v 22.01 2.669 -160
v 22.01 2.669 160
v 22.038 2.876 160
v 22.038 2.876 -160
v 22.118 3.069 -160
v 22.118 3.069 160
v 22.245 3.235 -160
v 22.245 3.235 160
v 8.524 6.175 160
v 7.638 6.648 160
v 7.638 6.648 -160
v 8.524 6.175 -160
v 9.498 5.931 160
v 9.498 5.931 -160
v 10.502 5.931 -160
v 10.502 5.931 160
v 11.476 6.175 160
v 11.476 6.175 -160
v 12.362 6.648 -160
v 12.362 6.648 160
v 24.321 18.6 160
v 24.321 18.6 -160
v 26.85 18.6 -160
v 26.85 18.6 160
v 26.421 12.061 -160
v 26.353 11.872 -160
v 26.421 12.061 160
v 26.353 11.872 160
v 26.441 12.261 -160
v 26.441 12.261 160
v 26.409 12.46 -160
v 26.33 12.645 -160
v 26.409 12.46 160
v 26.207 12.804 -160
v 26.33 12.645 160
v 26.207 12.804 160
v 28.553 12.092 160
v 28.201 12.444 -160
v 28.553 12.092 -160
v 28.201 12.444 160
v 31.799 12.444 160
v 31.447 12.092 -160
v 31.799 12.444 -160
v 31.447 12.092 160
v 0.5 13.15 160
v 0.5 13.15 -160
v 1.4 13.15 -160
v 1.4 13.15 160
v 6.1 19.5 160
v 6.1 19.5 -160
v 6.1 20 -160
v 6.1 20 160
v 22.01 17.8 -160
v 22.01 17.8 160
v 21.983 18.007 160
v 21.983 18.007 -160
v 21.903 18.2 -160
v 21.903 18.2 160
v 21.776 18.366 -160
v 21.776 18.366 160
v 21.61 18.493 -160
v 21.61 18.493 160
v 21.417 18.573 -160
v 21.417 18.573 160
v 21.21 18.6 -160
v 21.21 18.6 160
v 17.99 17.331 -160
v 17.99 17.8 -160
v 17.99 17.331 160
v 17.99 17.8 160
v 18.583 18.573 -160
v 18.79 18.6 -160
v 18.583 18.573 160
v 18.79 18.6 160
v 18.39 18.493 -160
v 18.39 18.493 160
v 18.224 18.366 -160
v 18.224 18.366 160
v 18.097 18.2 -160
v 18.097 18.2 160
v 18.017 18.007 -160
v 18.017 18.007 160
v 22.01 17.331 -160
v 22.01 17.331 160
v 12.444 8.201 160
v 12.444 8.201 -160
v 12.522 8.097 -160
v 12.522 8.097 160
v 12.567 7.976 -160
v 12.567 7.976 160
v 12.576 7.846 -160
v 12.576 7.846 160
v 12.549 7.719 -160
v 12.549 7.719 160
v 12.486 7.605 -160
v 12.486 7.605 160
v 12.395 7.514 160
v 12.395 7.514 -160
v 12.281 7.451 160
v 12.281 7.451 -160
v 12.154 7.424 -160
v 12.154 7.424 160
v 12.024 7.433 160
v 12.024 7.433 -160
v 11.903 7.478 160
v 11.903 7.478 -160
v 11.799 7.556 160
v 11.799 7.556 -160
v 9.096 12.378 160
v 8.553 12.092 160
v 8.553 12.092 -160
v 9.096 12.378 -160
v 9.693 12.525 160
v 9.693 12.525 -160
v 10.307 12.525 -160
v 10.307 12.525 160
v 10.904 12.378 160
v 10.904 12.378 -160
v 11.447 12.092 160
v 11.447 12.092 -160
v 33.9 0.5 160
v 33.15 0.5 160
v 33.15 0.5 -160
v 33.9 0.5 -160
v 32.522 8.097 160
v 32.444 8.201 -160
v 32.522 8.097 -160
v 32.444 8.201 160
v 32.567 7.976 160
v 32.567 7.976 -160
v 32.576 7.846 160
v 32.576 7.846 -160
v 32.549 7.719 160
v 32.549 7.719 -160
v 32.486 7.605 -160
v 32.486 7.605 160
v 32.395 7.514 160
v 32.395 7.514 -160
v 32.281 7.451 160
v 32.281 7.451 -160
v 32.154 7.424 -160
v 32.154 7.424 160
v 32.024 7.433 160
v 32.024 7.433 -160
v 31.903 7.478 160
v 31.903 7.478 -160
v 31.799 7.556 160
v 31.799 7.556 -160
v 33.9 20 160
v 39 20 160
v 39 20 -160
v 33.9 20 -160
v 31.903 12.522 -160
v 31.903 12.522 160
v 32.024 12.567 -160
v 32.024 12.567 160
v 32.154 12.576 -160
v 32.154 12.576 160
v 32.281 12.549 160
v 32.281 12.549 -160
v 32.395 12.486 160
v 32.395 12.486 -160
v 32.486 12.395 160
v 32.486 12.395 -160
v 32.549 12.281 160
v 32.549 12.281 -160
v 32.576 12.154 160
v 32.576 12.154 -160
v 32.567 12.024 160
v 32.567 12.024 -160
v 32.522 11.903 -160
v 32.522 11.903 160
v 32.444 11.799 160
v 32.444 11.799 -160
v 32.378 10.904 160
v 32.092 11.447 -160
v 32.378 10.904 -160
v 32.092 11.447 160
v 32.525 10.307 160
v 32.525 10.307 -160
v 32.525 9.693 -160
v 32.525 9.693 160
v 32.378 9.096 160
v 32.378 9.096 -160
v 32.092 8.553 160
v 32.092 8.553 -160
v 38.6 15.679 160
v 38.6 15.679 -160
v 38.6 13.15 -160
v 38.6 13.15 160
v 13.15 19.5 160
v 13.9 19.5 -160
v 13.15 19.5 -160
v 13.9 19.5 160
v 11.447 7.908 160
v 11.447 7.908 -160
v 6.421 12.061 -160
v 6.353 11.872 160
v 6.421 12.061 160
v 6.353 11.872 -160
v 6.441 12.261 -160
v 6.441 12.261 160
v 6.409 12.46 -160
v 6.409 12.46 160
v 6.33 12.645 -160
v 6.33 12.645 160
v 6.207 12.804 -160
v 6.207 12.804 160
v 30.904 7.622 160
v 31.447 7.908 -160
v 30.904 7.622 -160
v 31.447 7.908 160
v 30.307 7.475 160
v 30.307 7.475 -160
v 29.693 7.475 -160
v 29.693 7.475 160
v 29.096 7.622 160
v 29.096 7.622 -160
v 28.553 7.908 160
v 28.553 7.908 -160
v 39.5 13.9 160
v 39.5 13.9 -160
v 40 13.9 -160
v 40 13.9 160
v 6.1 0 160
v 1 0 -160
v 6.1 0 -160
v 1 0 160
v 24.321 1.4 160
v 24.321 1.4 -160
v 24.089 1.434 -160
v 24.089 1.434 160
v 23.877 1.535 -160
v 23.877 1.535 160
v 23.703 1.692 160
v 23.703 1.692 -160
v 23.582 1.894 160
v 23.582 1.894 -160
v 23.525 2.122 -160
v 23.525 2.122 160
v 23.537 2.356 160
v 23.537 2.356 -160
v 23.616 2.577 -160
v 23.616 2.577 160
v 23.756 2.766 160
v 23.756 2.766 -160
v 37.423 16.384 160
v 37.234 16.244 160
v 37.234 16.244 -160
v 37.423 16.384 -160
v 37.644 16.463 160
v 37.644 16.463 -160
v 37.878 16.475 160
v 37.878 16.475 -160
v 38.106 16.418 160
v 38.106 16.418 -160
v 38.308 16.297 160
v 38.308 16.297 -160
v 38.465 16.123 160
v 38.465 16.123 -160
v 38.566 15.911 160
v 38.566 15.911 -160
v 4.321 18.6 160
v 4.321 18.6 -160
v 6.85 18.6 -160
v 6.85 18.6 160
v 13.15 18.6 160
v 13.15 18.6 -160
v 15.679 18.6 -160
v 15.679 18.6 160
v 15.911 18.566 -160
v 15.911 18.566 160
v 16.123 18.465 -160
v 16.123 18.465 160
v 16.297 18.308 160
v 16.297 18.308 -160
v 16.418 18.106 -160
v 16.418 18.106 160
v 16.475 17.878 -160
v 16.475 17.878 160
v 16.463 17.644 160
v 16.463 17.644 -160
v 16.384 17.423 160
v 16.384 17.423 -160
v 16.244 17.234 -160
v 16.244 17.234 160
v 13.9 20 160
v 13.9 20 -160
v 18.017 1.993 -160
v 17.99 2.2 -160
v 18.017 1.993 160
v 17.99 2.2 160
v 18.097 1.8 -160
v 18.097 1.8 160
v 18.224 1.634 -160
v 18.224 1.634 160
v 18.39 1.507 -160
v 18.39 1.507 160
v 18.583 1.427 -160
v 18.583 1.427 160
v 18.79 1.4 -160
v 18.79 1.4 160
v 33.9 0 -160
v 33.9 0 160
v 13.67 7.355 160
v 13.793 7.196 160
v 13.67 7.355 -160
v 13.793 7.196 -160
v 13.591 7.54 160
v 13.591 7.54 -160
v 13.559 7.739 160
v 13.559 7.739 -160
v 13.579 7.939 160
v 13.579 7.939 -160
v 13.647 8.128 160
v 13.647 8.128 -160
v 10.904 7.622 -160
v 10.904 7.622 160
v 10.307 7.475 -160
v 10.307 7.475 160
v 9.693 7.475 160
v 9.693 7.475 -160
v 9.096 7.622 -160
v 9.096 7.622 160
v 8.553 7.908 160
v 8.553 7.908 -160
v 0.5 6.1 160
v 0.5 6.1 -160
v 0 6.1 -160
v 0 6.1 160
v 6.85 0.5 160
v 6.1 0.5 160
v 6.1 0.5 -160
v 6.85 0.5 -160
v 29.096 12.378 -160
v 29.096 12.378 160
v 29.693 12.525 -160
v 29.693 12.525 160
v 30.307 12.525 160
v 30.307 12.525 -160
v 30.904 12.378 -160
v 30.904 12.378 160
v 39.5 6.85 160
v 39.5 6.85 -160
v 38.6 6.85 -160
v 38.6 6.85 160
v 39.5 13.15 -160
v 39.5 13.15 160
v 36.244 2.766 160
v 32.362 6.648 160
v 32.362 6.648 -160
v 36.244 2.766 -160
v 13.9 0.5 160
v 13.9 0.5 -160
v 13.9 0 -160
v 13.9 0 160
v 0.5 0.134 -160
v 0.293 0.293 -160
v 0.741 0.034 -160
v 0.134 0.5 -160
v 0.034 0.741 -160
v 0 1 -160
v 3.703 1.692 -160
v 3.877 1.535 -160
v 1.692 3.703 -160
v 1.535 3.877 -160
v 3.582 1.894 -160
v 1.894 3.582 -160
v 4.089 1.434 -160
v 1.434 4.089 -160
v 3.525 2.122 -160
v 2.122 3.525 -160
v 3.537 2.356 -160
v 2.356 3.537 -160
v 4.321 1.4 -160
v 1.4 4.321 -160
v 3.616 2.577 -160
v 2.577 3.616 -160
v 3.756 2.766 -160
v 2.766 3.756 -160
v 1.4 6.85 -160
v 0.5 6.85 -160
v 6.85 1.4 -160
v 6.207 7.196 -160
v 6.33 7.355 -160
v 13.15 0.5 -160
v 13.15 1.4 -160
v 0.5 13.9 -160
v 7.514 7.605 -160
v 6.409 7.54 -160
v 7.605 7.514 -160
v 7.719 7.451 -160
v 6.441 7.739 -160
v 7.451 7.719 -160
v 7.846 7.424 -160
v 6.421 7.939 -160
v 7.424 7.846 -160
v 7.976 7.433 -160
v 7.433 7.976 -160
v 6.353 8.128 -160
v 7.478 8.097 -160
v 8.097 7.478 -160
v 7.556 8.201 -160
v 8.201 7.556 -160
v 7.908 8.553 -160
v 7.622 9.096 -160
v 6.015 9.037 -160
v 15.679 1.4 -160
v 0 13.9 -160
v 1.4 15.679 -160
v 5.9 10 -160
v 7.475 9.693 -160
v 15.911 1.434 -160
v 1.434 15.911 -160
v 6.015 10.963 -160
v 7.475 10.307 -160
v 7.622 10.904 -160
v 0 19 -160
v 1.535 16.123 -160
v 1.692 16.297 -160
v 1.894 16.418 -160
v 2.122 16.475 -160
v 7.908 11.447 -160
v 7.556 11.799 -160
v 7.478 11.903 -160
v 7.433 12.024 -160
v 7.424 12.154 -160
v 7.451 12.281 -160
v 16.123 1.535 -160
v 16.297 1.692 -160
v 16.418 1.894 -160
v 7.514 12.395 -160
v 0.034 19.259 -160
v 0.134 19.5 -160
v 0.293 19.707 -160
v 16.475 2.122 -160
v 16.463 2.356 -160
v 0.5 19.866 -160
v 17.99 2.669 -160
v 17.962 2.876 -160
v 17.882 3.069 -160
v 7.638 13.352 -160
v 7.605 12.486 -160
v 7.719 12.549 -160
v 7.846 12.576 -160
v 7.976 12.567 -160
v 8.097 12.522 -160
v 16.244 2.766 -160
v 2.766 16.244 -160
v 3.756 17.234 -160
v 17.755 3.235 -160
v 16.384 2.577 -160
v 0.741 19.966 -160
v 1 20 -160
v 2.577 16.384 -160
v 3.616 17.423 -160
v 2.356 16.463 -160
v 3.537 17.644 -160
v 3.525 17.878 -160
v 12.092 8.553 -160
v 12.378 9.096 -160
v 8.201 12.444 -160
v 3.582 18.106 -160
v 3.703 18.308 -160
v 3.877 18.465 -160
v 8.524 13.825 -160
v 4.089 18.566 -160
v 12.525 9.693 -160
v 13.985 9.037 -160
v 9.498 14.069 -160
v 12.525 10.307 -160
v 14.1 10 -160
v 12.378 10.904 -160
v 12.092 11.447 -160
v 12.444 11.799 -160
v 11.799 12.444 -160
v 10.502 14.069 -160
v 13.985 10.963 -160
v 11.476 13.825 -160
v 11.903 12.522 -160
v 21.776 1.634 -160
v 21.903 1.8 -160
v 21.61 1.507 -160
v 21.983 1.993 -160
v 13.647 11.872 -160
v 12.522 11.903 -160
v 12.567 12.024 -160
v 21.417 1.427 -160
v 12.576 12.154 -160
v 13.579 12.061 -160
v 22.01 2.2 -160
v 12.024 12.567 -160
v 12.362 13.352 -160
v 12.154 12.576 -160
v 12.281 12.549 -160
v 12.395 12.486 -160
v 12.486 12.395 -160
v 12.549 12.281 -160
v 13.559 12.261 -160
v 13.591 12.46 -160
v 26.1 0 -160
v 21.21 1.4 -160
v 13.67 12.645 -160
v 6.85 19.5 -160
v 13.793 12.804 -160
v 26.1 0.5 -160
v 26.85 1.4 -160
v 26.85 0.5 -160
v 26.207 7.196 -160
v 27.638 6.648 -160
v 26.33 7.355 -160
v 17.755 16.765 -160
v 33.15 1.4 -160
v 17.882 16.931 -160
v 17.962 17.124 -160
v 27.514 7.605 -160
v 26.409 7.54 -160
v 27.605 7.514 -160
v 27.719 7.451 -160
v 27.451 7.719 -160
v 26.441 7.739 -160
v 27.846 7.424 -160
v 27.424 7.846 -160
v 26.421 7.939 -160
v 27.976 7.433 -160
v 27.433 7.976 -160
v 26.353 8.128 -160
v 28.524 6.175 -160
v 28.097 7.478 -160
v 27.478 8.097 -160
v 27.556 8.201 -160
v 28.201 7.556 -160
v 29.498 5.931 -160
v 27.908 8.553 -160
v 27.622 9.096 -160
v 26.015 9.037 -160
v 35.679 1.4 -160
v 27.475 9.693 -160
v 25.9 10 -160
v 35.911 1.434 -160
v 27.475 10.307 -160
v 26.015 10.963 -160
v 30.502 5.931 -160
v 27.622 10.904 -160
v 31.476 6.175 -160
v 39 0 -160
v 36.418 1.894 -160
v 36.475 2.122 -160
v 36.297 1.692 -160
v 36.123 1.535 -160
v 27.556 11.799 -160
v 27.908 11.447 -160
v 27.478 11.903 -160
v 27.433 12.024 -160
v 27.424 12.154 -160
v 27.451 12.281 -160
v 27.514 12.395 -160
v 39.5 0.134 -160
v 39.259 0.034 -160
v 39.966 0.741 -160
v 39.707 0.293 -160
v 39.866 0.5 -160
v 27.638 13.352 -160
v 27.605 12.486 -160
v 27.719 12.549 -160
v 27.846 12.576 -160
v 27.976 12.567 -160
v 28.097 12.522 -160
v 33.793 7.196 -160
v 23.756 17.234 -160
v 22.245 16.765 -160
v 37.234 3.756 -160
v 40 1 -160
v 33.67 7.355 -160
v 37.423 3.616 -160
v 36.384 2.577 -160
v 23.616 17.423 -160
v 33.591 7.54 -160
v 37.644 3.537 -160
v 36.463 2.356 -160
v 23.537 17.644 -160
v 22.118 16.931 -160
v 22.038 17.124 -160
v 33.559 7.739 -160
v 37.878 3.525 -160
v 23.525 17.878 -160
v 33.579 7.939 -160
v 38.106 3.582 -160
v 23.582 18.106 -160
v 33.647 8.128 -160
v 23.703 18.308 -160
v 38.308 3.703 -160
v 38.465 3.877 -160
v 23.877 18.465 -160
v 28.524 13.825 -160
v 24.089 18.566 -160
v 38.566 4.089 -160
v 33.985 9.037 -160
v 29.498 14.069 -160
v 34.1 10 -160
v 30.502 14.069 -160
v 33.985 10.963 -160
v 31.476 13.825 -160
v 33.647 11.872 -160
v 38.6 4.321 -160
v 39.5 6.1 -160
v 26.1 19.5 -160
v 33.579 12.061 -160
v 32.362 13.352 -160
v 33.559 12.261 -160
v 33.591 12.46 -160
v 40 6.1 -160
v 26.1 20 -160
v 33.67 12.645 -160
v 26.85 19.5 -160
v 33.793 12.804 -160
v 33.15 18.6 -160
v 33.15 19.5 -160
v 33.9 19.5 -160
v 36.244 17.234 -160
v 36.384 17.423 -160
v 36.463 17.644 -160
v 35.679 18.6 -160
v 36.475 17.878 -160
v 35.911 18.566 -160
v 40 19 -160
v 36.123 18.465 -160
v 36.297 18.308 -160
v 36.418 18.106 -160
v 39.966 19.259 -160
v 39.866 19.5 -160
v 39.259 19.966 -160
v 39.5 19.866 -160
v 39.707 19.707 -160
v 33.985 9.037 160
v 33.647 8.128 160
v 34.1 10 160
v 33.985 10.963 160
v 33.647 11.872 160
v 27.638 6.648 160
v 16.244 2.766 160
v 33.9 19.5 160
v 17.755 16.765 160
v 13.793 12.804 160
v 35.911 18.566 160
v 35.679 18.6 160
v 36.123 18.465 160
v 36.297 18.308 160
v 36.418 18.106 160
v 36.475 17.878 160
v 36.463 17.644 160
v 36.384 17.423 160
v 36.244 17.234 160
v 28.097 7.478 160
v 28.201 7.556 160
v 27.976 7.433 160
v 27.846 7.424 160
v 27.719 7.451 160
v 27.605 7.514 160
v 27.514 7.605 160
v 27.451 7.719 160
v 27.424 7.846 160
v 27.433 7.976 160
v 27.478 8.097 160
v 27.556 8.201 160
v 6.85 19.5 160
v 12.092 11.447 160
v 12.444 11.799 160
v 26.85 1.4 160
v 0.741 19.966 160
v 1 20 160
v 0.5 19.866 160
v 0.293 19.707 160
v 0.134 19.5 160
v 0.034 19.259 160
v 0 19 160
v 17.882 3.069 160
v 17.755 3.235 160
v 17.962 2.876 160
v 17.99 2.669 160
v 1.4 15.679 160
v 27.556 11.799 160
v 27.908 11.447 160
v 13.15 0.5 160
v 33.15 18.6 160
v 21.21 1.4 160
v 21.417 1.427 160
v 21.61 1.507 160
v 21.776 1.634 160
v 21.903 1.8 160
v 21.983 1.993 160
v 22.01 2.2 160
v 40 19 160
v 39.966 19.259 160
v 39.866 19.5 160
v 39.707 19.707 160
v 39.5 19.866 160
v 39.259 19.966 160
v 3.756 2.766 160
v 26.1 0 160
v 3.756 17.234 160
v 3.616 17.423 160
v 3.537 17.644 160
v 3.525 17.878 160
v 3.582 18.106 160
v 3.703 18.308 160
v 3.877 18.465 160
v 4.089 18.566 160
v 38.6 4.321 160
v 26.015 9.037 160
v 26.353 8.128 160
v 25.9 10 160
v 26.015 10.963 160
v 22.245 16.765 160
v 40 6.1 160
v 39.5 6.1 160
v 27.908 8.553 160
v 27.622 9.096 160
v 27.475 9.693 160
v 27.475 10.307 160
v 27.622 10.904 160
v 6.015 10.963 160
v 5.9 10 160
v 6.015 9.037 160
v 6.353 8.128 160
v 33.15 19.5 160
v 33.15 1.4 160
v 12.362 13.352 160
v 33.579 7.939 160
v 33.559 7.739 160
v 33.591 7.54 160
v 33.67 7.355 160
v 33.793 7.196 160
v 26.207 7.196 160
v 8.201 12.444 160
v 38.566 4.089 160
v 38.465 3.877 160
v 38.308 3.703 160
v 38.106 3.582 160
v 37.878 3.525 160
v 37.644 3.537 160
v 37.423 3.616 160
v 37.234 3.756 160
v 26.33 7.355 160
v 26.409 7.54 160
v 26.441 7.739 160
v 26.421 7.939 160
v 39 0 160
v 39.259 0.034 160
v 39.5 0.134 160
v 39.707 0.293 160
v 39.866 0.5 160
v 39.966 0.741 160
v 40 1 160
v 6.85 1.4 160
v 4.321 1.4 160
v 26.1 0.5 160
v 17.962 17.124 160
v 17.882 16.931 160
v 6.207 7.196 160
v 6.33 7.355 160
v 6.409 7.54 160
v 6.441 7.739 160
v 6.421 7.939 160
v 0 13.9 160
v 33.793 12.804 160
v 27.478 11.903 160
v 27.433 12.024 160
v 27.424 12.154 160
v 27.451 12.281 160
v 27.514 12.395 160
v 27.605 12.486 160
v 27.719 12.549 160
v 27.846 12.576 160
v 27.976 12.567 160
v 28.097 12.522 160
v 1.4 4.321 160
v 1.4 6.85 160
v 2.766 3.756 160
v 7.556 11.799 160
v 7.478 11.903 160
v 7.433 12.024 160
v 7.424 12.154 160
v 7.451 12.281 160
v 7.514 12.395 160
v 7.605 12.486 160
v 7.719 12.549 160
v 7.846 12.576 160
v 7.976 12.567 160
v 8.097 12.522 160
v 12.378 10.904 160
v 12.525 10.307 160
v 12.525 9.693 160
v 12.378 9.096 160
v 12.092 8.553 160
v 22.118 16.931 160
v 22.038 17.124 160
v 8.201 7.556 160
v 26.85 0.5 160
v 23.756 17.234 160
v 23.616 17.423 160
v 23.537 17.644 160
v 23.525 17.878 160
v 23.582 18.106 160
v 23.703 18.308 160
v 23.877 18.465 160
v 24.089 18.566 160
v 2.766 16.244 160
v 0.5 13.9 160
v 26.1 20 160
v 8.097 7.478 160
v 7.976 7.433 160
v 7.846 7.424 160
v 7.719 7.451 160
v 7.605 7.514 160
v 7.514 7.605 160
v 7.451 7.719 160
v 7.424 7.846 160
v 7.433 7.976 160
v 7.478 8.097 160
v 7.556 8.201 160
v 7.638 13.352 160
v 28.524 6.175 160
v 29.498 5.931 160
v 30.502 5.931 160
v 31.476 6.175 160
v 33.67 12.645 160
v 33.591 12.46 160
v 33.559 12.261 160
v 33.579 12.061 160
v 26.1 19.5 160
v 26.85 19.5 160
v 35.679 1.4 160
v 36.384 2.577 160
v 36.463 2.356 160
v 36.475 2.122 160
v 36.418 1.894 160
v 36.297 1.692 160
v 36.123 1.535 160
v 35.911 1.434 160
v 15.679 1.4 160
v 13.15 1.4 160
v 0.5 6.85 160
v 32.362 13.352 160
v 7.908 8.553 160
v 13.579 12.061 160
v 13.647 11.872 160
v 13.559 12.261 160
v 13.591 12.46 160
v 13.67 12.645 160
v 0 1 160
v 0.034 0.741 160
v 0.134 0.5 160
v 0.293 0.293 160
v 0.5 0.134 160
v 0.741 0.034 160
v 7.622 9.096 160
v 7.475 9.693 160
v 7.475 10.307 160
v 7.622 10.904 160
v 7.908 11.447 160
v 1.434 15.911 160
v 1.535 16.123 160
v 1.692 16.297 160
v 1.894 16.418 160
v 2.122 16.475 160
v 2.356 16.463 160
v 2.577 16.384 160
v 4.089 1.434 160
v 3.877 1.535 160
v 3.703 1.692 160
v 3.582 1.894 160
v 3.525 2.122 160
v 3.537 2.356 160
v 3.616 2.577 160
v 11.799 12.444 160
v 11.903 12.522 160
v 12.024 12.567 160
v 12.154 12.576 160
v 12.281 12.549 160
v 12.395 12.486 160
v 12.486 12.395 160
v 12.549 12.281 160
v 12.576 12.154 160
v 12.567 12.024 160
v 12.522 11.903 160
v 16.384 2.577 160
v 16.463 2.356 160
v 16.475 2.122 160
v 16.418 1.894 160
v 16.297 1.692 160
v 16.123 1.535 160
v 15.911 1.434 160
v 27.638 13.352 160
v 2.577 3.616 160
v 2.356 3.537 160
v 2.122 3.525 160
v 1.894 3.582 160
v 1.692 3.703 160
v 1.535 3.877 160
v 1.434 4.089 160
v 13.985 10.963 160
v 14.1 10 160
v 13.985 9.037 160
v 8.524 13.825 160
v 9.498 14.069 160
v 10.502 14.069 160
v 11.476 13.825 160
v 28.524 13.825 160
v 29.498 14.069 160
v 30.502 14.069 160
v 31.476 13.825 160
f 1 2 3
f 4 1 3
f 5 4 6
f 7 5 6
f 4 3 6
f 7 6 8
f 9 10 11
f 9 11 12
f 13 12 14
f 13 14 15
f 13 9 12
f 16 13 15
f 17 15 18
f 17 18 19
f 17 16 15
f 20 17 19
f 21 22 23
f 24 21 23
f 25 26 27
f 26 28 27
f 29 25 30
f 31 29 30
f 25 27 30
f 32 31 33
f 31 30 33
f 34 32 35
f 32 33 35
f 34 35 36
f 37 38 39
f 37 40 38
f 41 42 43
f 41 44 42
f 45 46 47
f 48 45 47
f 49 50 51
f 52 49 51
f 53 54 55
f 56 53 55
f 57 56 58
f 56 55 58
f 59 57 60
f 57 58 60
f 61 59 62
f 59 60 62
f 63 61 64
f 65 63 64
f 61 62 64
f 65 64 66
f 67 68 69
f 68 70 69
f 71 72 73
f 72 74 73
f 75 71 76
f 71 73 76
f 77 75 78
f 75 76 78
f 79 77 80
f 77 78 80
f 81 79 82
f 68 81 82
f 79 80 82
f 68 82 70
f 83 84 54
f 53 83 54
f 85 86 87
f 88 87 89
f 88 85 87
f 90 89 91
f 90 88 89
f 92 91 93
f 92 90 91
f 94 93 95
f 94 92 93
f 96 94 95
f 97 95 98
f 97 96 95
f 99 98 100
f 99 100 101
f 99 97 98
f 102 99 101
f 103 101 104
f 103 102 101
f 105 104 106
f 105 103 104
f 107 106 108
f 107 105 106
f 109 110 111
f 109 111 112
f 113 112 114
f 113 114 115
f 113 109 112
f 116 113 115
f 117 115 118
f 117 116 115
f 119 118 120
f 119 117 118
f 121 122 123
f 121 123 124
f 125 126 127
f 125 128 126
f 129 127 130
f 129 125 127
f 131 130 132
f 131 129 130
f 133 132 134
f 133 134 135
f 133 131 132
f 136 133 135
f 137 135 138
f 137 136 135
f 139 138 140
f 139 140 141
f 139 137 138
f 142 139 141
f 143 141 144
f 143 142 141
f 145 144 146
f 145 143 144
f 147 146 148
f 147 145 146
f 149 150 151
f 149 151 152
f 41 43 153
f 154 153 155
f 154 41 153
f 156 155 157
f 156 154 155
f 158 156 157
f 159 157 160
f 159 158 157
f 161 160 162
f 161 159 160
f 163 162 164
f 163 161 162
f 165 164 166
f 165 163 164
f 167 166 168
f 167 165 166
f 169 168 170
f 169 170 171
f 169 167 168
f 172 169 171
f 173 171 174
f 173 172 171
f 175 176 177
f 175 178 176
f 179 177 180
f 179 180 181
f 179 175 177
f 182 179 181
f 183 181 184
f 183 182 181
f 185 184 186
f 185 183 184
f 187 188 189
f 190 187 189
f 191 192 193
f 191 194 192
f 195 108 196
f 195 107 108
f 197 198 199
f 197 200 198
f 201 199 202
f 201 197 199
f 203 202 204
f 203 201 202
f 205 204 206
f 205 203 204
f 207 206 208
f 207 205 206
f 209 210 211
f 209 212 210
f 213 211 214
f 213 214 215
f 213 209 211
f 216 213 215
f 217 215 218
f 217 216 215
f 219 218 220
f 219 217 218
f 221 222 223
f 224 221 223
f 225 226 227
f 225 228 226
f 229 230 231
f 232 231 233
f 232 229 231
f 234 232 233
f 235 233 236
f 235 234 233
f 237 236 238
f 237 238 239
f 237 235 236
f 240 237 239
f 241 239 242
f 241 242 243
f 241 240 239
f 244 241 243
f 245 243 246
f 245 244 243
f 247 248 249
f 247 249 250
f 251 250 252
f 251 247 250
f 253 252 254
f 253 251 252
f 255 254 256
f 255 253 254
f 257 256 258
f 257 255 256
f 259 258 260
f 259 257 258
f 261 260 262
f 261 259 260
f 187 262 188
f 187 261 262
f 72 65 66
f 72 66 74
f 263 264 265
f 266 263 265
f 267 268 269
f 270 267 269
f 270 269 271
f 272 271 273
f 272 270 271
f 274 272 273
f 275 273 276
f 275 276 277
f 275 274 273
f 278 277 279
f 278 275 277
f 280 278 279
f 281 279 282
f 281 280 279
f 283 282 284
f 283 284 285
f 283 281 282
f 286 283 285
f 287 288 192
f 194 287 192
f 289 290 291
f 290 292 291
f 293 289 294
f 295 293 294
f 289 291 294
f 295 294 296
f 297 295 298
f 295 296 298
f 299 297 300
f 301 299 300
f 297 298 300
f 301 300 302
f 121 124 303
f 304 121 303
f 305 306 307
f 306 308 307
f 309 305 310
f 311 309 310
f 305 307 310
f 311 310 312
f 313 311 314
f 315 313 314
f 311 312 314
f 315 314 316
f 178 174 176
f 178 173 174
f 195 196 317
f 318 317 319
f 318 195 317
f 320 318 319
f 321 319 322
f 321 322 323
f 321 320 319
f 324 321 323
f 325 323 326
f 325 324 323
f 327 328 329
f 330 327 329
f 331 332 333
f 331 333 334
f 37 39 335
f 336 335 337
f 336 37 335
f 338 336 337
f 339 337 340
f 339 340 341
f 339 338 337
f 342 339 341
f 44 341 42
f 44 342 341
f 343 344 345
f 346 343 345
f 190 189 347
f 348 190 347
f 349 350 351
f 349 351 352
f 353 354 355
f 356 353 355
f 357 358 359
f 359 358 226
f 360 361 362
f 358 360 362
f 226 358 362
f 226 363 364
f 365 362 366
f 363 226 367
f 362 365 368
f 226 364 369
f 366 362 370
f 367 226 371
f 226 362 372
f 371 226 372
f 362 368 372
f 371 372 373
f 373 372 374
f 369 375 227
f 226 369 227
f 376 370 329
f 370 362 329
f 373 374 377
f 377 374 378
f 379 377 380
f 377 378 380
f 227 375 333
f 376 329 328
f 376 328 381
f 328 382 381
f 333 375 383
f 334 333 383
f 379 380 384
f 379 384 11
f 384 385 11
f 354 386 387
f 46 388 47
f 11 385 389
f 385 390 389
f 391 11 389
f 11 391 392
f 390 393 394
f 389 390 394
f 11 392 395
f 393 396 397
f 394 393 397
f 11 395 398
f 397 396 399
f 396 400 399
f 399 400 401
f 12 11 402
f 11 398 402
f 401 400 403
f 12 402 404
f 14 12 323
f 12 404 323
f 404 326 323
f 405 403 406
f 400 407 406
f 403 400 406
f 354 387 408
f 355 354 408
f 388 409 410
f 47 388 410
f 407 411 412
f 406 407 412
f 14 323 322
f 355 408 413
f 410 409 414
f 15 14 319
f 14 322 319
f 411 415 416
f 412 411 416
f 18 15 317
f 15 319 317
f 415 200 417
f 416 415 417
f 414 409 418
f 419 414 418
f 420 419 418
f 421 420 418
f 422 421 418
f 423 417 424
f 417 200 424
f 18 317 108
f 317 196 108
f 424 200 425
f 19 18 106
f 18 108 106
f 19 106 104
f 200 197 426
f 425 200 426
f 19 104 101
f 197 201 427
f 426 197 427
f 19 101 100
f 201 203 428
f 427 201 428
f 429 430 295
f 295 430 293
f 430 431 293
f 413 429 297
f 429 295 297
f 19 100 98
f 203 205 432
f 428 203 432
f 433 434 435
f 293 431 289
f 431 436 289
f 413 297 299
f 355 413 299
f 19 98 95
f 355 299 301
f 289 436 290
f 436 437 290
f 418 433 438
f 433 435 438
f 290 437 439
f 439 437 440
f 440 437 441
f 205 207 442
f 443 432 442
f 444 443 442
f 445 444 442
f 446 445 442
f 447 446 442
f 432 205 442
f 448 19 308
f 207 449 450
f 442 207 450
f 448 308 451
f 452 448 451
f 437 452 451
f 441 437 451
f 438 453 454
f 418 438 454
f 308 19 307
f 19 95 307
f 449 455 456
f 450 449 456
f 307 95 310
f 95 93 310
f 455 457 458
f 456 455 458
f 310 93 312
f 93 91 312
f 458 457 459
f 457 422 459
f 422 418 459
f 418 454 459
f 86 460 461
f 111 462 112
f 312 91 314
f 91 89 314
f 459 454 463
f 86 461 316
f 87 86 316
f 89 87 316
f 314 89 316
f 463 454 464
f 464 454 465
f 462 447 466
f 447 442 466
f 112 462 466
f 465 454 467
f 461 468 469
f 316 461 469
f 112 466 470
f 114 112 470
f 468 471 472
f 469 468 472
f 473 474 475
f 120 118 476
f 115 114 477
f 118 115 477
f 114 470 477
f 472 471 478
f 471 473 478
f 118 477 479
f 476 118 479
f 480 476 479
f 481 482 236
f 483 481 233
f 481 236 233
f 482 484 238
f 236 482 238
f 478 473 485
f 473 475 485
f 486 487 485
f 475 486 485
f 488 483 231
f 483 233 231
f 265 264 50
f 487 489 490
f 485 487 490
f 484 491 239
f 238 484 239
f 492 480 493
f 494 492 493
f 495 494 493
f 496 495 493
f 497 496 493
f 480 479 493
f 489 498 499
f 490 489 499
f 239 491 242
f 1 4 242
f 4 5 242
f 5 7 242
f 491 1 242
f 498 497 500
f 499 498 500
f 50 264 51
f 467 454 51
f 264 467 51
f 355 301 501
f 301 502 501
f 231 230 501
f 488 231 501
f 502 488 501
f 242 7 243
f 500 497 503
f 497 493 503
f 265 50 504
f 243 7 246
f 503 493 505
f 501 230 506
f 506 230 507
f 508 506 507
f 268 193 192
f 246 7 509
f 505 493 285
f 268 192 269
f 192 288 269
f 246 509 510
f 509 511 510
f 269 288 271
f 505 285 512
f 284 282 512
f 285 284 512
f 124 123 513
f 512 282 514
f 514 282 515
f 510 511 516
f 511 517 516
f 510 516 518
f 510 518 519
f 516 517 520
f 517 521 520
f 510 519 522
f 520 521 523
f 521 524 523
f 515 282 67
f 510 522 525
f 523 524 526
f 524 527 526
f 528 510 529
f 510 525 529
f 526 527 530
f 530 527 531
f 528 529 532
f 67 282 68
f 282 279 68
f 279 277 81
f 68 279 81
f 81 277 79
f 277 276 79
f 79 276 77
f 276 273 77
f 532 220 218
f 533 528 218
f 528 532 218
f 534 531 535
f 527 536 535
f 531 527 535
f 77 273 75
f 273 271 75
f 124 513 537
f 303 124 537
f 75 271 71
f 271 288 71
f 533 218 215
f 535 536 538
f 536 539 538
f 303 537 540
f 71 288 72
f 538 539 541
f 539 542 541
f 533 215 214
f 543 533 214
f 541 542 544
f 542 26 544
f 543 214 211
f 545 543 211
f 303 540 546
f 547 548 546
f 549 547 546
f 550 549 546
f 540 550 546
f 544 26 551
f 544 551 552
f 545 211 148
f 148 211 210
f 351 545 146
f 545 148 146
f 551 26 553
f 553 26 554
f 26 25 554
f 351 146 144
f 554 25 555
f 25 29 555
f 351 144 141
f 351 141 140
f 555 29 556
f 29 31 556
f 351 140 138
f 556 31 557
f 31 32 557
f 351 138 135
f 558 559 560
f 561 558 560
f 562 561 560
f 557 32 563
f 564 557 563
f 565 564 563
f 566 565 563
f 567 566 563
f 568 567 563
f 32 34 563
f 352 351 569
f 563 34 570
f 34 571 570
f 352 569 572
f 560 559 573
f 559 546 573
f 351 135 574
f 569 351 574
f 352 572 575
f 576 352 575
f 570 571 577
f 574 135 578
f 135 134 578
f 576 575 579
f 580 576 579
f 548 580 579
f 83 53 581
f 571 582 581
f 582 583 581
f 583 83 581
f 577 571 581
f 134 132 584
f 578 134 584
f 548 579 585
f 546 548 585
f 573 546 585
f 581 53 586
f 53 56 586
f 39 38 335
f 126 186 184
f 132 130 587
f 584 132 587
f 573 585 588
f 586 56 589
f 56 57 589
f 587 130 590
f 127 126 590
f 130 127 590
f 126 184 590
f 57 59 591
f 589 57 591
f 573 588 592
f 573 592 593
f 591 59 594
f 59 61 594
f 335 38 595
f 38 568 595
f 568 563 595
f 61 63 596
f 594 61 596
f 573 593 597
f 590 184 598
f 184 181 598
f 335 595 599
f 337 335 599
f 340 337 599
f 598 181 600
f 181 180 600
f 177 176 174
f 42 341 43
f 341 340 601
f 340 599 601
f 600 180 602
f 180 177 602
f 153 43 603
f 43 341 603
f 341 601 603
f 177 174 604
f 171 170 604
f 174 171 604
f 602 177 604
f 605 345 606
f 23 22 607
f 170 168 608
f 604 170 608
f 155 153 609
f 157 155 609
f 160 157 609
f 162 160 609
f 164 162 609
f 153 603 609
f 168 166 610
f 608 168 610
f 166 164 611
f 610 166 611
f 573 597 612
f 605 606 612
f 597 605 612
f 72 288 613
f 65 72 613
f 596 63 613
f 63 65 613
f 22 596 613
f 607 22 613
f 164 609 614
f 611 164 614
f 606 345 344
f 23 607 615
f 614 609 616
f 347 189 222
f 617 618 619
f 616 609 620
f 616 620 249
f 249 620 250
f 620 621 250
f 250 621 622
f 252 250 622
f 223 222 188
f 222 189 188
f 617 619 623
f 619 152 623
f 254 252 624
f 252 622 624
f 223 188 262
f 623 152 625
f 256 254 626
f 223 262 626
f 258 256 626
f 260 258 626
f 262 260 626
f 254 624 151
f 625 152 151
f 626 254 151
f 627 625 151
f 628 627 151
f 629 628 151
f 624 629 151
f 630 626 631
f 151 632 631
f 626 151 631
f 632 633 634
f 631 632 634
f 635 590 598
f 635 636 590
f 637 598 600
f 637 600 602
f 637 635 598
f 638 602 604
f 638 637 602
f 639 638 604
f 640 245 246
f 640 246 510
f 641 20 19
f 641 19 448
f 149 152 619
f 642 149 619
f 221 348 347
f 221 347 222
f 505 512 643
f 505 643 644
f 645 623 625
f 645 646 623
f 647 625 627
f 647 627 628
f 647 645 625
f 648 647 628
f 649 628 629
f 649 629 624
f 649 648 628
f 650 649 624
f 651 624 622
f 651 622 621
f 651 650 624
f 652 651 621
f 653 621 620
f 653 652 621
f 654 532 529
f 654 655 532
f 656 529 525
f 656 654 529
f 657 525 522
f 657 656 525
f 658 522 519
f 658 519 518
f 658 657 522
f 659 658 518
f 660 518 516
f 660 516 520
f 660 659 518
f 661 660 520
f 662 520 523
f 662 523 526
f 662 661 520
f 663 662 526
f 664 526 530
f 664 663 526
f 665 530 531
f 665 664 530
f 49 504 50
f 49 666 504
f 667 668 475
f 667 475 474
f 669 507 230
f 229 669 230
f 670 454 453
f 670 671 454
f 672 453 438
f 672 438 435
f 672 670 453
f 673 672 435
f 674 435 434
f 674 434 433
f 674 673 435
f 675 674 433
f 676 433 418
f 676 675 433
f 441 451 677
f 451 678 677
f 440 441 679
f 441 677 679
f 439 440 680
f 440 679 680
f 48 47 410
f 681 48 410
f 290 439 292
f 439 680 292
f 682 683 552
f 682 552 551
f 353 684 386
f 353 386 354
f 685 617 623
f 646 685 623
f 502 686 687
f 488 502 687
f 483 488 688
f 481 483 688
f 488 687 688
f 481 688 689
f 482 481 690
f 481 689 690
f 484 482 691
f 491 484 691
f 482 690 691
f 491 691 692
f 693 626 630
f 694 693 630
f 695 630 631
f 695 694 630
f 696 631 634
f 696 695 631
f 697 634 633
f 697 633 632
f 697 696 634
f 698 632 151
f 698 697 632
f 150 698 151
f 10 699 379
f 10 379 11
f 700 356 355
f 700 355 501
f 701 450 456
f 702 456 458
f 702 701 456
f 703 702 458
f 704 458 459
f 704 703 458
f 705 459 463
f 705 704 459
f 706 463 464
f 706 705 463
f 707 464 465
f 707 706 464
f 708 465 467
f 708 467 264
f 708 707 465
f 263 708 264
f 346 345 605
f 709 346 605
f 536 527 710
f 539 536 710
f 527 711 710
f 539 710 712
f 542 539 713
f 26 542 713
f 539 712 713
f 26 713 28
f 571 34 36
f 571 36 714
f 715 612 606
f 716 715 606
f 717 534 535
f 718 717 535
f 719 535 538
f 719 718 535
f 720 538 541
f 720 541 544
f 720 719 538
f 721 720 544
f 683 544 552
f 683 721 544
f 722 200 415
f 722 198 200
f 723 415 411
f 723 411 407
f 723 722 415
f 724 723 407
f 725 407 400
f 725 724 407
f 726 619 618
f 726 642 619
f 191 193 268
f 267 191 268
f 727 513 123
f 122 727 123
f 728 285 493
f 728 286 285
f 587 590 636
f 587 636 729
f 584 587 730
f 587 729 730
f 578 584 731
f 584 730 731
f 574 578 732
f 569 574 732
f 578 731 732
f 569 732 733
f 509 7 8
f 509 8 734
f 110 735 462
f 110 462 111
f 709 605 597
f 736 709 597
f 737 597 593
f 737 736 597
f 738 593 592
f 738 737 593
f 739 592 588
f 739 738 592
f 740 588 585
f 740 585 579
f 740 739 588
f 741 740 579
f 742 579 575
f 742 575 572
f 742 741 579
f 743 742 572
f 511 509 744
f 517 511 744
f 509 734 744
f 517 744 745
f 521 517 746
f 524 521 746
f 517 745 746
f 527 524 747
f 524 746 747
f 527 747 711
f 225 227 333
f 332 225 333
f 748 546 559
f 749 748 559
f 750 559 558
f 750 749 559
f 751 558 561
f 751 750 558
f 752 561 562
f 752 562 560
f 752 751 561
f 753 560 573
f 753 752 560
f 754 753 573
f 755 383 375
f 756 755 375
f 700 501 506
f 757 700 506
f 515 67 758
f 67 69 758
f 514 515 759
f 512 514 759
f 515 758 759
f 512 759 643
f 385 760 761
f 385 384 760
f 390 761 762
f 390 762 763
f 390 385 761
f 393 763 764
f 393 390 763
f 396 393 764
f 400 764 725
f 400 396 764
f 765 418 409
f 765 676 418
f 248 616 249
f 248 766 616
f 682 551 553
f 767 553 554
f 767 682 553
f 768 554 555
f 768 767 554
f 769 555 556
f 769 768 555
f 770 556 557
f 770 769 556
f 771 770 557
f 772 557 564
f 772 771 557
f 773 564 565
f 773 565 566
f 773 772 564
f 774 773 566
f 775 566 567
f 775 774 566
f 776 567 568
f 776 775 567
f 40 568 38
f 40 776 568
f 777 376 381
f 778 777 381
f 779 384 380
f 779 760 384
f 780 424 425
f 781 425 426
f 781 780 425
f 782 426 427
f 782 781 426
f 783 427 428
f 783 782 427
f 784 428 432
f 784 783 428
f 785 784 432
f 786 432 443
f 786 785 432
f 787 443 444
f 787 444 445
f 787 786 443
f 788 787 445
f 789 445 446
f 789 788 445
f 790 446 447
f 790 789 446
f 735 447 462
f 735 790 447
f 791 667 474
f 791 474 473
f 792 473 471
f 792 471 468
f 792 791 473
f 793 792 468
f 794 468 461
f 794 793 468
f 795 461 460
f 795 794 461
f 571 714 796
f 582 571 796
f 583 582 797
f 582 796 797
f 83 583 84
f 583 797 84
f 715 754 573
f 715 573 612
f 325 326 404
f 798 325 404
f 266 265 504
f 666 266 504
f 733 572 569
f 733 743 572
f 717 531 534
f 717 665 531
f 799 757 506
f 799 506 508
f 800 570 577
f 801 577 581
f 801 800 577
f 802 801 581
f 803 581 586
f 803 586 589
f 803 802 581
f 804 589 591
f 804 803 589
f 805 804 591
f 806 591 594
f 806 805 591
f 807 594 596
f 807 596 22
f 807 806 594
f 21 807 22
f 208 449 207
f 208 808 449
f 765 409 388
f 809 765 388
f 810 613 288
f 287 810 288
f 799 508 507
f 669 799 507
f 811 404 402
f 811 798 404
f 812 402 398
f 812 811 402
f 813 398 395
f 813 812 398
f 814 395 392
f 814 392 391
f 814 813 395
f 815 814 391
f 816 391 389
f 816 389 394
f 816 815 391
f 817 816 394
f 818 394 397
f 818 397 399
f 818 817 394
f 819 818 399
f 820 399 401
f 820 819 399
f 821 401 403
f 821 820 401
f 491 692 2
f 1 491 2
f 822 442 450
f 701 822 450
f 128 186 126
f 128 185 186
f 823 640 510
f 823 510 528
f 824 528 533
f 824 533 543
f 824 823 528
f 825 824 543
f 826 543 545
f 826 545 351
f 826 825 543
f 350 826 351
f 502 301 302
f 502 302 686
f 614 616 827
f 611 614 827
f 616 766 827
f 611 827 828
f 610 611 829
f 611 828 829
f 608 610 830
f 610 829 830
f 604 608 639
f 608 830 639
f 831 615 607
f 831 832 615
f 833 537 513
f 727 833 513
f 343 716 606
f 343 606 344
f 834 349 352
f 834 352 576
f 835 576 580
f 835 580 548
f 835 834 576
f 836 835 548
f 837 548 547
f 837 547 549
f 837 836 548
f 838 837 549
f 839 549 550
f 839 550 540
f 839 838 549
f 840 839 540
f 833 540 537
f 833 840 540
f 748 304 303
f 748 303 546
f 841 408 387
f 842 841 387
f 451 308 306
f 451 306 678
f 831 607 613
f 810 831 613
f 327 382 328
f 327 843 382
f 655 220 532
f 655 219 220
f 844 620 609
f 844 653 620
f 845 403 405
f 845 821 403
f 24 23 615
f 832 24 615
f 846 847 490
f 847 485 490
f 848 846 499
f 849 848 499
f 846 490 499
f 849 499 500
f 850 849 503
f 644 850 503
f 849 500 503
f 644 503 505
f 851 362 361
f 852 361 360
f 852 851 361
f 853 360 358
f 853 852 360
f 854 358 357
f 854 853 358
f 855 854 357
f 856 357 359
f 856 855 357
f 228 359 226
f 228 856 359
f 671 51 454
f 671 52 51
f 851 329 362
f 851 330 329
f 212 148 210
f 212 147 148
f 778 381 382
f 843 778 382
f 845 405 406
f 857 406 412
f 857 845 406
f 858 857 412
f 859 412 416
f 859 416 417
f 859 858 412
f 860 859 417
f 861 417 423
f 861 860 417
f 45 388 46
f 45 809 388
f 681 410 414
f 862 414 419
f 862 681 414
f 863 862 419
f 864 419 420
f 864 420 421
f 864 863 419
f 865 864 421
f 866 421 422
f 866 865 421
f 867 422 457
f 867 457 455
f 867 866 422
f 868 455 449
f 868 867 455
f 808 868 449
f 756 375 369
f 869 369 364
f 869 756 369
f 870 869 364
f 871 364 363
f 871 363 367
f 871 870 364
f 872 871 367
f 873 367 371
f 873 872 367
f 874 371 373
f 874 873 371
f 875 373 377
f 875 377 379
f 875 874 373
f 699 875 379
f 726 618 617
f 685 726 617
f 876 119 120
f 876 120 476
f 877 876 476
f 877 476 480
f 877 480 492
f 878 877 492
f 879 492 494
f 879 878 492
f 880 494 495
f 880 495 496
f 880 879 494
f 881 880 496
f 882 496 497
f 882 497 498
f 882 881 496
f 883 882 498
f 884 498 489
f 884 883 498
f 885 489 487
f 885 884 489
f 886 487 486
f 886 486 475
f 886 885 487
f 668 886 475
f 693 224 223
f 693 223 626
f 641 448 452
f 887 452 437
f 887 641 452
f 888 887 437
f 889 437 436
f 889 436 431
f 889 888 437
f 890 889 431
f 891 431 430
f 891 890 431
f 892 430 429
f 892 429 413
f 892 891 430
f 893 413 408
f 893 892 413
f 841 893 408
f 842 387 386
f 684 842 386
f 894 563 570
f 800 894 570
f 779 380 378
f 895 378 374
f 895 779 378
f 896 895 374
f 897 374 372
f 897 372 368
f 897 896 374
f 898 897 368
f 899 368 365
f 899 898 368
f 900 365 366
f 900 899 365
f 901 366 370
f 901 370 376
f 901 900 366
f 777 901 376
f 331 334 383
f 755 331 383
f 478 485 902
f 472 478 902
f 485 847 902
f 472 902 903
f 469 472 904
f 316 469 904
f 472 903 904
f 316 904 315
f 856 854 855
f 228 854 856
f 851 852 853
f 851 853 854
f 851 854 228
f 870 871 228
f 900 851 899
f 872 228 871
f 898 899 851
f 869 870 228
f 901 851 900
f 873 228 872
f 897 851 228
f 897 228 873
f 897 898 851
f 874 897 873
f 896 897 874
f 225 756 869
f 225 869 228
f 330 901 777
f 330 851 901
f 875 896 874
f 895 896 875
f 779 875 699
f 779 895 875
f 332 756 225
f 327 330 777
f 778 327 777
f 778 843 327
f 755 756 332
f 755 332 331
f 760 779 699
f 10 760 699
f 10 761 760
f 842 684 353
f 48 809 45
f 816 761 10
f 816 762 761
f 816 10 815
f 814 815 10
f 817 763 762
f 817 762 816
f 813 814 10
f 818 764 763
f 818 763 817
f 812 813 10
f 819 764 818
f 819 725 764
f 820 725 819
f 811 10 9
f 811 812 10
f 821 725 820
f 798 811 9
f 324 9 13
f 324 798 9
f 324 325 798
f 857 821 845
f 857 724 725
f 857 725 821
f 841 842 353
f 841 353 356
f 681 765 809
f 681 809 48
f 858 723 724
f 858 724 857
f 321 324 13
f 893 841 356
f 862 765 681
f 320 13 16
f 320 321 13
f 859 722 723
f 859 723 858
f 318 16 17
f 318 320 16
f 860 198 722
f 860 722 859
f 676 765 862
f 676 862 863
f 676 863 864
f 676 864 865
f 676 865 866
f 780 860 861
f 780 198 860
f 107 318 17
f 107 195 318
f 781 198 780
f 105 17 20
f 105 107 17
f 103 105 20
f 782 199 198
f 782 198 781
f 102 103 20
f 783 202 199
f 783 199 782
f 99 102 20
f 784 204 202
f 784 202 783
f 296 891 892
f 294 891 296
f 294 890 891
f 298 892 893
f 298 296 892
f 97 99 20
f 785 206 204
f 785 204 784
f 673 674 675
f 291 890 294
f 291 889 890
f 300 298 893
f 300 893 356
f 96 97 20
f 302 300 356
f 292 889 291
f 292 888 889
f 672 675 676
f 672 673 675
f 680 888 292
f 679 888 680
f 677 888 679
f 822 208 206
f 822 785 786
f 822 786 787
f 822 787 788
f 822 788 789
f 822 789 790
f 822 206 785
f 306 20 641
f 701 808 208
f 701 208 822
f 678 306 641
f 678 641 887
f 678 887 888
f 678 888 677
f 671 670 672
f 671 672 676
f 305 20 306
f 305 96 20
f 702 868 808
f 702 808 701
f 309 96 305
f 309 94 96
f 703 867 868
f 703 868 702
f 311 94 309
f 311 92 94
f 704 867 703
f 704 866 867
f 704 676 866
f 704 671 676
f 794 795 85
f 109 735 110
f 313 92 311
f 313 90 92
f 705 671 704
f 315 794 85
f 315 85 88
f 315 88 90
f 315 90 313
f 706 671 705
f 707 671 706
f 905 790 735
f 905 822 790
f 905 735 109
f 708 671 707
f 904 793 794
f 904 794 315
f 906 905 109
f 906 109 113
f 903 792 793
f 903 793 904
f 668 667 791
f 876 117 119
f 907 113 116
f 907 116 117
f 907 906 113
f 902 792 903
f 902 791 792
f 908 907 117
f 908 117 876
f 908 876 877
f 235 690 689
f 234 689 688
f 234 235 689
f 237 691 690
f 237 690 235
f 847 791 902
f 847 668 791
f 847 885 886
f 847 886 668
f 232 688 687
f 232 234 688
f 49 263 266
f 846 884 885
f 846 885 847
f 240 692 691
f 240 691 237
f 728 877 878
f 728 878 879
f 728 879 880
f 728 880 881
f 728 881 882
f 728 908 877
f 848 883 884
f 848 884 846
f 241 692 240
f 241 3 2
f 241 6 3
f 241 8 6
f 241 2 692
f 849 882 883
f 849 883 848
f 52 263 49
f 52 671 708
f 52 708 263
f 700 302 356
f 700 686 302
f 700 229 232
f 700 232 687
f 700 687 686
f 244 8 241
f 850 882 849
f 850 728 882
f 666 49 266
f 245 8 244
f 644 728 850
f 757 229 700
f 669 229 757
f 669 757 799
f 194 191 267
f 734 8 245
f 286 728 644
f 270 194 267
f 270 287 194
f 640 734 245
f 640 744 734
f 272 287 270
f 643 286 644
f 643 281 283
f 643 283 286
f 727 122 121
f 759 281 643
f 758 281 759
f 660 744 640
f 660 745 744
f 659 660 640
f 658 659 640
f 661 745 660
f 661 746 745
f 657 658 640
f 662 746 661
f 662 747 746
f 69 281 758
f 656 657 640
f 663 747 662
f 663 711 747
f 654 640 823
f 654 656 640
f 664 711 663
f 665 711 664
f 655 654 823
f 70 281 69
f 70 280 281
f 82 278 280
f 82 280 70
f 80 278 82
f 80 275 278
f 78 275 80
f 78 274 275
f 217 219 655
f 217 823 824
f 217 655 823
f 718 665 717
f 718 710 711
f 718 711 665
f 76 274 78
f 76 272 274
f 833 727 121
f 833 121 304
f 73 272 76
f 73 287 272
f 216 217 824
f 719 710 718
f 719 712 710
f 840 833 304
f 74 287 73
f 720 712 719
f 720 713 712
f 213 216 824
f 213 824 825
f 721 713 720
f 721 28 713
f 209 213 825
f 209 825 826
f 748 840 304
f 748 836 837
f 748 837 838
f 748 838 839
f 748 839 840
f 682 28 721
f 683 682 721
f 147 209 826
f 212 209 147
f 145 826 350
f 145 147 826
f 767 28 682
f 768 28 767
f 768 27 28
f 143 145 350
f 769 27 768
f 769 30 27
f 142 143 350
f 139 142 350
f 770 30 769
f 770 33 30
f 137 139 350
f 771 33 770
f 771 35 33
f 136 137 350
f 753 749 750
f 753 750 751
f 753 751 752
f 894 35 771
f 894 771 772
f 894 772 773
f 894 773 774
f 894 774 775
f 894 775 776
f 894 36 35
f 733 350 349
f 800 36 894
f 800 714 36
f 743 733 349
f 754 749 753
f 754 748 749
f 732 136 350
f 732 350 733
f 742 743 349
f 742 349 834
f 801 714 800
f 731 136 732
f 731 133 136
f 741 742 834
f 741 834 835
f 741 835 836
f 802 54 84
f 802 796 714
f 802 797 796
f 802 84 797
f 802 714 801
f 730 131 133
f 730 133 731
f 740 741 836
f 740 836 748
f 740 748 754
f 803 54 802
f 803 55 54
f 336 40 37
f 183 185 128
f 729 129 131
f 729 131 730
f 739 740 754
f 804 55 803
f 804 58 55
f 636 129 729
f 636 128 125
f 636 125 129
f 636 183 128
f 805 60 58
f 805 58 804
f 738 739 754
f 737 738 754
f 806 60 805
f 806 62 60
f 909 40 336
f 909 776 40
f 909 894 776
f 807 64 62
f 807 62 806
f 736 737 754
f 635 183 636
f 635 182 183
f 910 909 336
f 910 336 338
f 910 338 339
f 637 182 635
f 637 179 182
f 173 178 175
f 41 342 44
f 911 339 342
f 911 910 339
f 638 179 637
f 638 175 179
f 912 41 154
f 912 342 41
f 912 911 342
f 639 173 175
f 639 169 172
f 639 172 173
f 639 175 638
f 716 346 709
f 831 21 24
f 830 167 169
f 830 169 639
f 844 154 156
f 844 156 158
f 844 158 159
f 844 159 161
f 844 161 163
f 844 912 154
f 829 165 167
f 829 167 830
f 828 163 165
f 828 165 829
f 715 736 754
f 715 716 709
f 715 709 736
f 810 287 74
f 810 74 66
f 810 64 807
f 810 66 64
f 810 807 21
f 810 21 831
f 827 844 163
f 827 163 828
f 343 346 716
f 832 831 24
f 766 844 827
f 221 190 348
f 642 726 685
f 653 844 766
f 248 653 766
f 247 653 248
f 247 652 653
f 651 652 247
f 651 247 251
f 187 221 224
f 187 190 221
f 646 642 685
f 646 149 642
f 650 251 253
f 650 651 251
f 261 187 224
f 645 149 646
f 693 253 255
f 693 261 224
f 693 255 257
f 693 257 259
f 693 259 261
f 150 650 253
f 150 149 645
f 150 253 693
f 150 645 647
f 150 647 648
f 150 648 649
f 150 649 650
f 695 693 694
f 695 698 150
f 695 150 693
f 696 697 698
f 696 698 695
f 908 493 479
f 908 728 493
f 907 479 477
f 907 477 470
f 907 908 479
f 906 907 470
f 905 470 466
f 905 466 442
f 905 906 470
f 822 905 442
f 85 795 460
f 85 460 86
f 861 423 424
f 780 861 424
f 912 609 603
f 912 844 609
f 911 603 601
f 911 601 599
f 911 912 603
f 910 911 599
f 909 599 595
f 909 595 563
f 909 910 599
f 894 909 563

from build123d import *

# Parameters (mm, degrees)
Y_KSEKLIK_EKSTR_ZYON2_DEPTH = 160
RADYUS1_R                   = 0.8


with BuildPart() as part:
    # Çizim3 → Yükseklik-Ekstrüzyon2 (new body, symmetric)
    with BuildSketch(Plane.XY):
        with BuildLine():
            Line((1, 0), (6.1, 0))
            Line((6.1, 0), (6.1, 0.5))
            Line((6.1, 0.5), (6.85, 0.5))
            Line((6.85, 0.5), (6.85, 1.4))
            Line((6.85, 1.4), (4.321320344, 1.4))
            ThreePointArc((4.321320344, 1.4), (3.582216718, 1.893853254), (3.755634919, 2.765685425))
            Line((3.755634919, 2.765685425), (7.638403375, 6.648453882))
            ThreePointArc((7.638403375, 6.648453882), (10, 5.9), (12.361596625, 6.648453882))
            Line((12.361596625, 6.648453882), (16.244365081, 2.765685425))
            ThreePointArc((16.244365081, 2.765685425), (16.417783282, 1.893853254), (15.678679656, 1.4))
            Line((15.678679656, 1.4), (13.15, 1.4))
            Line((13.15, 1.4), (13.15, 0.5))
            Line((13.15, 0.5), (13.9, 0.5))
            Line((13.9, 0.5), (13.9, 0))
            Line((13.9, 0), (26.1, 0))
            Line((26.1, 0), (26.1, 0.5))
            Line((26.1, 0.5), (26.85, 0.5))
            Line((26.85, 0.5), (26.85, 1.4))
            Line((26.85, 1.4), (24.321320344, 1.4))
            ThreePointArc((24.321320344, 1.4), (23.582216718, 1.893853254), (23.755634919, 2.765685425))
            Line((23.755634919, 2.765685425), (27.638403375, 6.648453882))
            ThreePointArc((27.638403375, 6.648453882), (30, 5.9), (32.361596625, 6.648453882))
            Line((32.361596625, 6.648453882), (36.244365081, 2.765685425))
            ThreePointArc((36.244365081, 2.765685425), (36.417783282, 1.893853254), (35.678679656, 1.4))
            Line((35.678679656, 1.4), (33.15, 1.4))
            Line((33.15, 1.4), (33.15, 0.5))
            Line((33.15, 0.5), (33.9, 0.5))
            Line((33.9, 0.5), (33.9, 0))
            Line((33.9, 0), (39, 0))
            ThreePointArc((39, 0), (39.707106781, 0.292893219), (40, 1))
            Line((40, 1), (40, 6.1))
            Line((40, 6.1), (39.5, 6.1))
            Line((39.5, 6.1), (39.5, 6.85))
            Line((39.5, 6.85), (38.6, 6.85))
            Line((38.6, 6.85), (38.6, 4.321320344))
            ThreePointArc((38.6, 4.321320344), (38.106146746, 3.582216718), (37.234314575, 3.755634919))
            Line((37.234314575, 3.755634919), (33.351546118, 7.638403375))
            ThreePointArc((33.351546118, 7.638403375), (34.1, 10), (33.351546118, 12.361596625))
            Line((33.351546118, 12.361596625), (37.234314575, 16.244365081))
            ThreePointArc((37.234314575, 16.244365081), (38.106146746, 16.417783282), (38.6, 15.678679656))
            Line((38.6, 15.678679656), (38.6, 13.15))
            Line((38.6, 13.15), (39.5, 13.15))
            Line((39.5, 13.15), (39.5, 13.9))
            Line((39.5, 13.9), (40, 13.9))
            Line((40, 13.9), (40, 19))
            ThreePointArc((40, 19), (39.707106781, 19.707106781), (39, 20))
            Line((39, 20), (33.9, 20))
            Line((33.9, 20), (33.9, 19.5))
            Line((33.9, 19.5), (33.15, 19.5))
            Line((33.15, 19.5), (33.15, 18.6))
            Line((33.15, 18.6), (35.678679656, 18.6))
            ThreePointArc((35.678679656, 18.6), (36.417783282, 18.106146746), (36.244365081, 17.234314575))
            Line((36.244365081, 17.234314575), (32.361596625, 13.351546118))
            ThreePointArc((32.361596625, 13.351546118), (30, 14.1), (27.638403375, 13.351546118))
            Line((27.638403375, 13.351546118), (23.755634919, 17.234314575))
            ThreePointArc((23.755634919, 17.234314575), (23.582216718, 18.106146746), (24.321320344, 18.6))
            Line((24.321320344, 18.6), (26.85, 18.6))
            Line((26.85, 18.6), (26.85, 19.5))
            Line((26.85, 19.5), (26.1, 19.5))
            Line((26.1, 19.5), (26.1, 20))
            Line((26.1, 20), (13.9, 20))
            Line((13.9, 20), (13.9, 19.5))
            Line((13.9, 19.5), (13.15, 19.5))
            Line((13.15, 19.5), (13.15, 18.6))
            Line((13.15, 18.6), (15.678679656, 18.6))
            ThreePointArc((15.678679656, 18.6), (16.417783282, 18.106146746), (16.244365081, 17.234314575))
            Line((16.244365081, 17.234314575), (12.361596625, 13.351546118))
            ThreePointArc((12.361596625, 13.351546118), (10, 14.1), (7.638403375, 13.351546118))
            Line((7.638403375, 13.351546118), (3.755634919, 17.234314575))
            ThreePointArc((3.755634919, 17.234314575), (3.582216718, 18.106146746), (4.321320344, 18.6))
            Line((4.321320344, 18.6), (6.85, 18.6))
            Line((6.85, 18.6), (6.85, 19.5))
            Line((6.85, 19.5), (6.1, 19.5))
            Line((6.1, 19.5), (6.1, 20))
            Line((6.1, 20), (1, 20))
            ThreePointArc((1, 20), (0.292893219, 19.707106781), (0, 19))
            Line((0, 19), (0, 13.9))
            Line((0, 13.9), (0.5, 13.9))
            Line((0.5, 13.9), (0.5, 13.15))
            Line((0.5, 13.15), (1.4, 13.15))
            Line((1.4, 13.15), (1.4, 15.678679656))
            ThreePointArc((1.4, 15.678679656), (1.893853254, 16.417783282), (2.765685425, 16.244365081))
            Line((2.765685425, 16.244365081), (6.648453882, 12.361596625))
            ThreePointArc((6.648453882, 12.361596625), (5.9, 10), (6.648453882, 7.638403375))
            Line((6.648453882, 7.638403375), (2.765685425, 3.755634919))
            ThreePointArc((2.765685425, 3.755634919), (1.893853254, 3.582216718), (1.4, 4.321320344))
            Line((1.4, 4.321320344), (1.4, 6.85))
            Line((1.4, 6.85), (0.5, 6.85))
            Line((0.5, 6.85), (0.5, 6.1))
            Line((0.5, 6.1), (0, 6.1))
            Line((0, 6.1), (0, 1))
            ThreePointArc((0, 1), (0.292893219, 0.292893219), (1, 0))
        make_face()
        with BuildLine():
            Line((21.210320913, 18.6), (18.789679087, 18.6))
            ThreePointArc((18.789679087, 18.6), (18.223993662, 18.365685425), (17.989679087, 17.8))
            Line((17.989679087, 17.8), (17.989679087, 17.331100443))
            ThreePointArc((17.989679087, 17.331100443), (17.928782713, 17.024953697), (17.755364512, 16.765415018))
            Line((17.755364512, 16.765415018), (13.351546118, 12.361596625))
            ThreePointArc((13.351546118, 12.361596625), (14.1, 10), (13.351546118, 7.638403375))
            Line((13.351546118, 7.638403375), (17.755364512, 3.234584982))
            ThreePointArc((17.755364512, 3.234584982), (17.928782713, 2.975046303), (17.989679087, 2.668899557))
            Line((17.989679087, 2.668899557), (17.989679087, 2.2))
            ThreePointArc((17.989679087, 2.2), (18.223993662, 1.634314575), (18.789679087, 1.4))
            Line((18.789679087, 1.4), (21.210320913, 1.4))
            ThreePointArc((21.210320913, 1.4), (21.776006338, 1.634314575), (22.010320913, 2.2))
            Line((22.010320913, 2.2), (22.010320913, 2.668899557))
            ThreePointArc((22.010320913, 2.668899557), (22.071217287, 2.975046303), (22.244635488, 3.234584982))
            Line((22.244635488, 3.234584982), (26.648453882, 7.638403375))
            ThreePointArc((26.648453882, 7.638403375), (25.9, 10), (26.648453882, 12.361596625))
            Line((26.648453882, 12.361596625), (22.244635488, 16.765415018))
            ThreePointArc((22.244635488, 16.765415018), (22.071217287, 17.024953697), (22.010320913, 17.331100443))
            Line((22.010320913, 17.331100443), (22.010320913, 17.8))
            ThreePointArc((22.010320913, 17.8), (21.776006338, 18.365685425), (21.210320913, 18.6))
        make_face(mode=Mode.SUBTRACT)
        with BuildLine():
            Line((8.201142588, 12.443783276), (8.552743846, 12.092182018))
            ThreePointArc((8.552743846, 12.092182018), (10, 12.543968548), (11.447256154, 12.092182018))
            Line((11.447256154, 12.092182018), (11.798857412, 12.443783276))
            ThreePointArc((11.798857412, 12.443783276), (12.443783276, 12.443783276), (12.443783276, 11.798857412))
            Line((12.443783276, 11.798857412), (12.092182018, 11.447256154))
            ThreePointArc((12.092182018, 11.447256154), (12.543968548, 10), (12.092182018, 8.552743846))
            Line((12.092182018, 8.552743846), (12.443783276, 8.201142588))
            ThreePointArc((12.443783276, 8.201142588), (12.443783276, 7.556216724), (11.798857412, 7.556216724))
            Line((11.798857412, 7.556216724), (11.447256154, 7.907817982))
            ThreePointArc((11.447256154, 7.907817982), (10, 7.456031452), (8.552743846, 7.907817982))
            Line((8.552743846, 7.907817982), (8.201142588, 7.556216724))
            ThreePointArc((8.201142588, 7.556216724), (7.556216724, 7.556216724), (7.556216724, 8.201142588))
            Line((7.556216724, 8.201142588), (7.907817982, 8.552743846))
            ThreePointArc((7.907817982, 8.552743846), (7.456031452, 10), (7.907817982, 11.447256154))
            Line((7.907817982, 11.447256154), (7.556216724, 11.798857412))
            ThreePointArc((7.556216724, 11.798857412), (7.556216724, 12.443783276), (8.201142588, 12.443783276))
        make_face(mode=Mode.SUBTRACT)
        with BuildLine():
            Line((27.907817982, 11.447256154), (27.556216724, 11.798857412))
            ThreePointArc((27.556216724, 11.798857412), (27.556216724, 12.443783276), (28.201142588, 12.443783276))
            Line((28.201142588, 12.443783276), (28.552743846, 12.092182018))
            ThreePointArc((28.552743846, 12.092182018), (30, 12.543968548), (31.447256154, 12.092182018))
            Line((31.447256154, 12.092182018), (31.798857412, 12.443783276))
            ThreePointArc((31.798857412, 12.443783276), (32.443783276, 12.443783276), (32.443783276, 11.798857412))
            Line((32.443783276, 11.798857412), (32.092182018, 11.447256154))
            ThreePointArc((32.092182018, 11.447256154), (32.543968548, 10), (32.092182018, 8.552743846))
            Line((32.092182018, 8.552743846), (32.443783276, 8.201142588))
            ThreePointArc((32.443783276, 8.201142588), (32.443783276, 7.556216724), (31.798857412, 7.556216724))
            Line((31.798857412, 7.556216724), (31.447256154, 7.907817982))
            ThreePointArc((31.447256154, 7.907817982), (30, 7.456031452), (28.552743846, 7.907817982))
            Line((28.552743846, 7.907817982), (28.201142588, 7.556216724))
            ThreePointArc((28.201142588, 7.556216724), (27.556216724, 7.556216724), (27.556216724, 8.201142588))
            Line((27.556216724, 8.201142588), (27.907817982, 8.552743846))
            ThreePointArc((27.907817982, 8.552743846), (27.456031452, 10), (27.907817982, 11.447256154))
        make_face(mode=Mode.SUBTRACT)
    extrude(amount=Y_KSEKLIK_EKSTR_ZYON2_DEPTH, both=True)

    # Radyus1
    radyus1_edges = [part.edges().sort_by_distance(p)[0] for p in [
        (6.648453882, 7.638403375, 0),
        (6.648453882, 12.361596625, 0),
        (33.351546118, 12.361596625, 0),
        (33.351546118, 7.638403375, 0),
        (13.351546118, 12.361596625, 0),
        (13.351546118, 7.638403375, 0),
        (26.648453882, 7.638403375, 0),
        (26.648453882, 12.361596625, 0),
    ]]
    fillet(radyus1_edges, radius=RADYUS1_R)


solid = part.part
